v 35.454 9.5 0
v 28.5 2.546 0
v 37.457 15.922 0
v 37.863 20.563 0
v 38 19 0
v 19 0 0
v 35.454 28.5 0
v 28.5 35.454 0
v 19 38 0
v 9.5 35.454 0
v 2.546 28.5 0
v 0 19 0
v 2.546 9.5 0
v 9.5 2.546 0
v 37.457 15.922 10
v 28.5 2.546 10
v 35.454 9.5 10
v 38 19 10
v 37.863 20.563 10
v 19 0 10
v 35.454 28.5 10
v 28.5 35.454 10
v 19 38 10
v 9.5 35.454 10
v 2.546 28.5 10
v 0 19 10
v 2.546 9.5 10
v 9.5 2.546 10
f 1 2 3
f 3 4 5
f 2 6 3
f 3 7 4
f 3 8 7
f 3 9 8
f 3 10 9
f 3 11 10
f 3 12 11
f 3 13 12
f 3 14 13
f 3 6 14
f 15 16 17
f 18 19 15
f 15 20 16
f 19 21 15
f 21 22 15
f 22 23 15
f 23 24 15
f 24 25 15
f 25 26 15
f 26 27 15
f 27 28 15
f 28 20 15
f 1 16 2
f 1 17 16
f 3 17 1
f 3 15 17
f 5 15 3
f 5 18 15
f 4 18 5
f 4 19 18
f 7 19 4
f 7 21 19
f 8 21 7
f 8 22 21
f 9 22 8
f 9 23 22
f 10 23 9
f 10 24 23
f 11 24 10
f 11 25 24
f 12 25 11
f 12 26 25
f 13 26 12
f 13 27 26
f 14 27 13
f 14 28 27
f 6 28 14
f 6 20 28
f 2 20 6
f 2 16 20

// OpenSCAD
$fn = 32;

// ----------------------------------------------------------------------
// Eccentric disc: step, 10 mm thick
// ----------------------------------------------------------------------

// --- parameters (mm) ---
profile_height = 10;      // extrusion height
profile_points = 14;      // points of the closed outline

profile = [[0, 19], [2.546, 9.5], [9.5, 2.546], [19, 0], [28.5, 2.546], [35.454, 9.5], [37.457, 15.922], [38, 19], [37.863, 20.563], [35.454, 28.5], [28.5, 35.454], [19, 38], [9.5, 35.454], [2.546, 28.5]];  // single closed polygon, 14 points, counter clockwise

// --- the one profile operation ---
linear_extrude(height = profile_height) polygon(points = profile);
